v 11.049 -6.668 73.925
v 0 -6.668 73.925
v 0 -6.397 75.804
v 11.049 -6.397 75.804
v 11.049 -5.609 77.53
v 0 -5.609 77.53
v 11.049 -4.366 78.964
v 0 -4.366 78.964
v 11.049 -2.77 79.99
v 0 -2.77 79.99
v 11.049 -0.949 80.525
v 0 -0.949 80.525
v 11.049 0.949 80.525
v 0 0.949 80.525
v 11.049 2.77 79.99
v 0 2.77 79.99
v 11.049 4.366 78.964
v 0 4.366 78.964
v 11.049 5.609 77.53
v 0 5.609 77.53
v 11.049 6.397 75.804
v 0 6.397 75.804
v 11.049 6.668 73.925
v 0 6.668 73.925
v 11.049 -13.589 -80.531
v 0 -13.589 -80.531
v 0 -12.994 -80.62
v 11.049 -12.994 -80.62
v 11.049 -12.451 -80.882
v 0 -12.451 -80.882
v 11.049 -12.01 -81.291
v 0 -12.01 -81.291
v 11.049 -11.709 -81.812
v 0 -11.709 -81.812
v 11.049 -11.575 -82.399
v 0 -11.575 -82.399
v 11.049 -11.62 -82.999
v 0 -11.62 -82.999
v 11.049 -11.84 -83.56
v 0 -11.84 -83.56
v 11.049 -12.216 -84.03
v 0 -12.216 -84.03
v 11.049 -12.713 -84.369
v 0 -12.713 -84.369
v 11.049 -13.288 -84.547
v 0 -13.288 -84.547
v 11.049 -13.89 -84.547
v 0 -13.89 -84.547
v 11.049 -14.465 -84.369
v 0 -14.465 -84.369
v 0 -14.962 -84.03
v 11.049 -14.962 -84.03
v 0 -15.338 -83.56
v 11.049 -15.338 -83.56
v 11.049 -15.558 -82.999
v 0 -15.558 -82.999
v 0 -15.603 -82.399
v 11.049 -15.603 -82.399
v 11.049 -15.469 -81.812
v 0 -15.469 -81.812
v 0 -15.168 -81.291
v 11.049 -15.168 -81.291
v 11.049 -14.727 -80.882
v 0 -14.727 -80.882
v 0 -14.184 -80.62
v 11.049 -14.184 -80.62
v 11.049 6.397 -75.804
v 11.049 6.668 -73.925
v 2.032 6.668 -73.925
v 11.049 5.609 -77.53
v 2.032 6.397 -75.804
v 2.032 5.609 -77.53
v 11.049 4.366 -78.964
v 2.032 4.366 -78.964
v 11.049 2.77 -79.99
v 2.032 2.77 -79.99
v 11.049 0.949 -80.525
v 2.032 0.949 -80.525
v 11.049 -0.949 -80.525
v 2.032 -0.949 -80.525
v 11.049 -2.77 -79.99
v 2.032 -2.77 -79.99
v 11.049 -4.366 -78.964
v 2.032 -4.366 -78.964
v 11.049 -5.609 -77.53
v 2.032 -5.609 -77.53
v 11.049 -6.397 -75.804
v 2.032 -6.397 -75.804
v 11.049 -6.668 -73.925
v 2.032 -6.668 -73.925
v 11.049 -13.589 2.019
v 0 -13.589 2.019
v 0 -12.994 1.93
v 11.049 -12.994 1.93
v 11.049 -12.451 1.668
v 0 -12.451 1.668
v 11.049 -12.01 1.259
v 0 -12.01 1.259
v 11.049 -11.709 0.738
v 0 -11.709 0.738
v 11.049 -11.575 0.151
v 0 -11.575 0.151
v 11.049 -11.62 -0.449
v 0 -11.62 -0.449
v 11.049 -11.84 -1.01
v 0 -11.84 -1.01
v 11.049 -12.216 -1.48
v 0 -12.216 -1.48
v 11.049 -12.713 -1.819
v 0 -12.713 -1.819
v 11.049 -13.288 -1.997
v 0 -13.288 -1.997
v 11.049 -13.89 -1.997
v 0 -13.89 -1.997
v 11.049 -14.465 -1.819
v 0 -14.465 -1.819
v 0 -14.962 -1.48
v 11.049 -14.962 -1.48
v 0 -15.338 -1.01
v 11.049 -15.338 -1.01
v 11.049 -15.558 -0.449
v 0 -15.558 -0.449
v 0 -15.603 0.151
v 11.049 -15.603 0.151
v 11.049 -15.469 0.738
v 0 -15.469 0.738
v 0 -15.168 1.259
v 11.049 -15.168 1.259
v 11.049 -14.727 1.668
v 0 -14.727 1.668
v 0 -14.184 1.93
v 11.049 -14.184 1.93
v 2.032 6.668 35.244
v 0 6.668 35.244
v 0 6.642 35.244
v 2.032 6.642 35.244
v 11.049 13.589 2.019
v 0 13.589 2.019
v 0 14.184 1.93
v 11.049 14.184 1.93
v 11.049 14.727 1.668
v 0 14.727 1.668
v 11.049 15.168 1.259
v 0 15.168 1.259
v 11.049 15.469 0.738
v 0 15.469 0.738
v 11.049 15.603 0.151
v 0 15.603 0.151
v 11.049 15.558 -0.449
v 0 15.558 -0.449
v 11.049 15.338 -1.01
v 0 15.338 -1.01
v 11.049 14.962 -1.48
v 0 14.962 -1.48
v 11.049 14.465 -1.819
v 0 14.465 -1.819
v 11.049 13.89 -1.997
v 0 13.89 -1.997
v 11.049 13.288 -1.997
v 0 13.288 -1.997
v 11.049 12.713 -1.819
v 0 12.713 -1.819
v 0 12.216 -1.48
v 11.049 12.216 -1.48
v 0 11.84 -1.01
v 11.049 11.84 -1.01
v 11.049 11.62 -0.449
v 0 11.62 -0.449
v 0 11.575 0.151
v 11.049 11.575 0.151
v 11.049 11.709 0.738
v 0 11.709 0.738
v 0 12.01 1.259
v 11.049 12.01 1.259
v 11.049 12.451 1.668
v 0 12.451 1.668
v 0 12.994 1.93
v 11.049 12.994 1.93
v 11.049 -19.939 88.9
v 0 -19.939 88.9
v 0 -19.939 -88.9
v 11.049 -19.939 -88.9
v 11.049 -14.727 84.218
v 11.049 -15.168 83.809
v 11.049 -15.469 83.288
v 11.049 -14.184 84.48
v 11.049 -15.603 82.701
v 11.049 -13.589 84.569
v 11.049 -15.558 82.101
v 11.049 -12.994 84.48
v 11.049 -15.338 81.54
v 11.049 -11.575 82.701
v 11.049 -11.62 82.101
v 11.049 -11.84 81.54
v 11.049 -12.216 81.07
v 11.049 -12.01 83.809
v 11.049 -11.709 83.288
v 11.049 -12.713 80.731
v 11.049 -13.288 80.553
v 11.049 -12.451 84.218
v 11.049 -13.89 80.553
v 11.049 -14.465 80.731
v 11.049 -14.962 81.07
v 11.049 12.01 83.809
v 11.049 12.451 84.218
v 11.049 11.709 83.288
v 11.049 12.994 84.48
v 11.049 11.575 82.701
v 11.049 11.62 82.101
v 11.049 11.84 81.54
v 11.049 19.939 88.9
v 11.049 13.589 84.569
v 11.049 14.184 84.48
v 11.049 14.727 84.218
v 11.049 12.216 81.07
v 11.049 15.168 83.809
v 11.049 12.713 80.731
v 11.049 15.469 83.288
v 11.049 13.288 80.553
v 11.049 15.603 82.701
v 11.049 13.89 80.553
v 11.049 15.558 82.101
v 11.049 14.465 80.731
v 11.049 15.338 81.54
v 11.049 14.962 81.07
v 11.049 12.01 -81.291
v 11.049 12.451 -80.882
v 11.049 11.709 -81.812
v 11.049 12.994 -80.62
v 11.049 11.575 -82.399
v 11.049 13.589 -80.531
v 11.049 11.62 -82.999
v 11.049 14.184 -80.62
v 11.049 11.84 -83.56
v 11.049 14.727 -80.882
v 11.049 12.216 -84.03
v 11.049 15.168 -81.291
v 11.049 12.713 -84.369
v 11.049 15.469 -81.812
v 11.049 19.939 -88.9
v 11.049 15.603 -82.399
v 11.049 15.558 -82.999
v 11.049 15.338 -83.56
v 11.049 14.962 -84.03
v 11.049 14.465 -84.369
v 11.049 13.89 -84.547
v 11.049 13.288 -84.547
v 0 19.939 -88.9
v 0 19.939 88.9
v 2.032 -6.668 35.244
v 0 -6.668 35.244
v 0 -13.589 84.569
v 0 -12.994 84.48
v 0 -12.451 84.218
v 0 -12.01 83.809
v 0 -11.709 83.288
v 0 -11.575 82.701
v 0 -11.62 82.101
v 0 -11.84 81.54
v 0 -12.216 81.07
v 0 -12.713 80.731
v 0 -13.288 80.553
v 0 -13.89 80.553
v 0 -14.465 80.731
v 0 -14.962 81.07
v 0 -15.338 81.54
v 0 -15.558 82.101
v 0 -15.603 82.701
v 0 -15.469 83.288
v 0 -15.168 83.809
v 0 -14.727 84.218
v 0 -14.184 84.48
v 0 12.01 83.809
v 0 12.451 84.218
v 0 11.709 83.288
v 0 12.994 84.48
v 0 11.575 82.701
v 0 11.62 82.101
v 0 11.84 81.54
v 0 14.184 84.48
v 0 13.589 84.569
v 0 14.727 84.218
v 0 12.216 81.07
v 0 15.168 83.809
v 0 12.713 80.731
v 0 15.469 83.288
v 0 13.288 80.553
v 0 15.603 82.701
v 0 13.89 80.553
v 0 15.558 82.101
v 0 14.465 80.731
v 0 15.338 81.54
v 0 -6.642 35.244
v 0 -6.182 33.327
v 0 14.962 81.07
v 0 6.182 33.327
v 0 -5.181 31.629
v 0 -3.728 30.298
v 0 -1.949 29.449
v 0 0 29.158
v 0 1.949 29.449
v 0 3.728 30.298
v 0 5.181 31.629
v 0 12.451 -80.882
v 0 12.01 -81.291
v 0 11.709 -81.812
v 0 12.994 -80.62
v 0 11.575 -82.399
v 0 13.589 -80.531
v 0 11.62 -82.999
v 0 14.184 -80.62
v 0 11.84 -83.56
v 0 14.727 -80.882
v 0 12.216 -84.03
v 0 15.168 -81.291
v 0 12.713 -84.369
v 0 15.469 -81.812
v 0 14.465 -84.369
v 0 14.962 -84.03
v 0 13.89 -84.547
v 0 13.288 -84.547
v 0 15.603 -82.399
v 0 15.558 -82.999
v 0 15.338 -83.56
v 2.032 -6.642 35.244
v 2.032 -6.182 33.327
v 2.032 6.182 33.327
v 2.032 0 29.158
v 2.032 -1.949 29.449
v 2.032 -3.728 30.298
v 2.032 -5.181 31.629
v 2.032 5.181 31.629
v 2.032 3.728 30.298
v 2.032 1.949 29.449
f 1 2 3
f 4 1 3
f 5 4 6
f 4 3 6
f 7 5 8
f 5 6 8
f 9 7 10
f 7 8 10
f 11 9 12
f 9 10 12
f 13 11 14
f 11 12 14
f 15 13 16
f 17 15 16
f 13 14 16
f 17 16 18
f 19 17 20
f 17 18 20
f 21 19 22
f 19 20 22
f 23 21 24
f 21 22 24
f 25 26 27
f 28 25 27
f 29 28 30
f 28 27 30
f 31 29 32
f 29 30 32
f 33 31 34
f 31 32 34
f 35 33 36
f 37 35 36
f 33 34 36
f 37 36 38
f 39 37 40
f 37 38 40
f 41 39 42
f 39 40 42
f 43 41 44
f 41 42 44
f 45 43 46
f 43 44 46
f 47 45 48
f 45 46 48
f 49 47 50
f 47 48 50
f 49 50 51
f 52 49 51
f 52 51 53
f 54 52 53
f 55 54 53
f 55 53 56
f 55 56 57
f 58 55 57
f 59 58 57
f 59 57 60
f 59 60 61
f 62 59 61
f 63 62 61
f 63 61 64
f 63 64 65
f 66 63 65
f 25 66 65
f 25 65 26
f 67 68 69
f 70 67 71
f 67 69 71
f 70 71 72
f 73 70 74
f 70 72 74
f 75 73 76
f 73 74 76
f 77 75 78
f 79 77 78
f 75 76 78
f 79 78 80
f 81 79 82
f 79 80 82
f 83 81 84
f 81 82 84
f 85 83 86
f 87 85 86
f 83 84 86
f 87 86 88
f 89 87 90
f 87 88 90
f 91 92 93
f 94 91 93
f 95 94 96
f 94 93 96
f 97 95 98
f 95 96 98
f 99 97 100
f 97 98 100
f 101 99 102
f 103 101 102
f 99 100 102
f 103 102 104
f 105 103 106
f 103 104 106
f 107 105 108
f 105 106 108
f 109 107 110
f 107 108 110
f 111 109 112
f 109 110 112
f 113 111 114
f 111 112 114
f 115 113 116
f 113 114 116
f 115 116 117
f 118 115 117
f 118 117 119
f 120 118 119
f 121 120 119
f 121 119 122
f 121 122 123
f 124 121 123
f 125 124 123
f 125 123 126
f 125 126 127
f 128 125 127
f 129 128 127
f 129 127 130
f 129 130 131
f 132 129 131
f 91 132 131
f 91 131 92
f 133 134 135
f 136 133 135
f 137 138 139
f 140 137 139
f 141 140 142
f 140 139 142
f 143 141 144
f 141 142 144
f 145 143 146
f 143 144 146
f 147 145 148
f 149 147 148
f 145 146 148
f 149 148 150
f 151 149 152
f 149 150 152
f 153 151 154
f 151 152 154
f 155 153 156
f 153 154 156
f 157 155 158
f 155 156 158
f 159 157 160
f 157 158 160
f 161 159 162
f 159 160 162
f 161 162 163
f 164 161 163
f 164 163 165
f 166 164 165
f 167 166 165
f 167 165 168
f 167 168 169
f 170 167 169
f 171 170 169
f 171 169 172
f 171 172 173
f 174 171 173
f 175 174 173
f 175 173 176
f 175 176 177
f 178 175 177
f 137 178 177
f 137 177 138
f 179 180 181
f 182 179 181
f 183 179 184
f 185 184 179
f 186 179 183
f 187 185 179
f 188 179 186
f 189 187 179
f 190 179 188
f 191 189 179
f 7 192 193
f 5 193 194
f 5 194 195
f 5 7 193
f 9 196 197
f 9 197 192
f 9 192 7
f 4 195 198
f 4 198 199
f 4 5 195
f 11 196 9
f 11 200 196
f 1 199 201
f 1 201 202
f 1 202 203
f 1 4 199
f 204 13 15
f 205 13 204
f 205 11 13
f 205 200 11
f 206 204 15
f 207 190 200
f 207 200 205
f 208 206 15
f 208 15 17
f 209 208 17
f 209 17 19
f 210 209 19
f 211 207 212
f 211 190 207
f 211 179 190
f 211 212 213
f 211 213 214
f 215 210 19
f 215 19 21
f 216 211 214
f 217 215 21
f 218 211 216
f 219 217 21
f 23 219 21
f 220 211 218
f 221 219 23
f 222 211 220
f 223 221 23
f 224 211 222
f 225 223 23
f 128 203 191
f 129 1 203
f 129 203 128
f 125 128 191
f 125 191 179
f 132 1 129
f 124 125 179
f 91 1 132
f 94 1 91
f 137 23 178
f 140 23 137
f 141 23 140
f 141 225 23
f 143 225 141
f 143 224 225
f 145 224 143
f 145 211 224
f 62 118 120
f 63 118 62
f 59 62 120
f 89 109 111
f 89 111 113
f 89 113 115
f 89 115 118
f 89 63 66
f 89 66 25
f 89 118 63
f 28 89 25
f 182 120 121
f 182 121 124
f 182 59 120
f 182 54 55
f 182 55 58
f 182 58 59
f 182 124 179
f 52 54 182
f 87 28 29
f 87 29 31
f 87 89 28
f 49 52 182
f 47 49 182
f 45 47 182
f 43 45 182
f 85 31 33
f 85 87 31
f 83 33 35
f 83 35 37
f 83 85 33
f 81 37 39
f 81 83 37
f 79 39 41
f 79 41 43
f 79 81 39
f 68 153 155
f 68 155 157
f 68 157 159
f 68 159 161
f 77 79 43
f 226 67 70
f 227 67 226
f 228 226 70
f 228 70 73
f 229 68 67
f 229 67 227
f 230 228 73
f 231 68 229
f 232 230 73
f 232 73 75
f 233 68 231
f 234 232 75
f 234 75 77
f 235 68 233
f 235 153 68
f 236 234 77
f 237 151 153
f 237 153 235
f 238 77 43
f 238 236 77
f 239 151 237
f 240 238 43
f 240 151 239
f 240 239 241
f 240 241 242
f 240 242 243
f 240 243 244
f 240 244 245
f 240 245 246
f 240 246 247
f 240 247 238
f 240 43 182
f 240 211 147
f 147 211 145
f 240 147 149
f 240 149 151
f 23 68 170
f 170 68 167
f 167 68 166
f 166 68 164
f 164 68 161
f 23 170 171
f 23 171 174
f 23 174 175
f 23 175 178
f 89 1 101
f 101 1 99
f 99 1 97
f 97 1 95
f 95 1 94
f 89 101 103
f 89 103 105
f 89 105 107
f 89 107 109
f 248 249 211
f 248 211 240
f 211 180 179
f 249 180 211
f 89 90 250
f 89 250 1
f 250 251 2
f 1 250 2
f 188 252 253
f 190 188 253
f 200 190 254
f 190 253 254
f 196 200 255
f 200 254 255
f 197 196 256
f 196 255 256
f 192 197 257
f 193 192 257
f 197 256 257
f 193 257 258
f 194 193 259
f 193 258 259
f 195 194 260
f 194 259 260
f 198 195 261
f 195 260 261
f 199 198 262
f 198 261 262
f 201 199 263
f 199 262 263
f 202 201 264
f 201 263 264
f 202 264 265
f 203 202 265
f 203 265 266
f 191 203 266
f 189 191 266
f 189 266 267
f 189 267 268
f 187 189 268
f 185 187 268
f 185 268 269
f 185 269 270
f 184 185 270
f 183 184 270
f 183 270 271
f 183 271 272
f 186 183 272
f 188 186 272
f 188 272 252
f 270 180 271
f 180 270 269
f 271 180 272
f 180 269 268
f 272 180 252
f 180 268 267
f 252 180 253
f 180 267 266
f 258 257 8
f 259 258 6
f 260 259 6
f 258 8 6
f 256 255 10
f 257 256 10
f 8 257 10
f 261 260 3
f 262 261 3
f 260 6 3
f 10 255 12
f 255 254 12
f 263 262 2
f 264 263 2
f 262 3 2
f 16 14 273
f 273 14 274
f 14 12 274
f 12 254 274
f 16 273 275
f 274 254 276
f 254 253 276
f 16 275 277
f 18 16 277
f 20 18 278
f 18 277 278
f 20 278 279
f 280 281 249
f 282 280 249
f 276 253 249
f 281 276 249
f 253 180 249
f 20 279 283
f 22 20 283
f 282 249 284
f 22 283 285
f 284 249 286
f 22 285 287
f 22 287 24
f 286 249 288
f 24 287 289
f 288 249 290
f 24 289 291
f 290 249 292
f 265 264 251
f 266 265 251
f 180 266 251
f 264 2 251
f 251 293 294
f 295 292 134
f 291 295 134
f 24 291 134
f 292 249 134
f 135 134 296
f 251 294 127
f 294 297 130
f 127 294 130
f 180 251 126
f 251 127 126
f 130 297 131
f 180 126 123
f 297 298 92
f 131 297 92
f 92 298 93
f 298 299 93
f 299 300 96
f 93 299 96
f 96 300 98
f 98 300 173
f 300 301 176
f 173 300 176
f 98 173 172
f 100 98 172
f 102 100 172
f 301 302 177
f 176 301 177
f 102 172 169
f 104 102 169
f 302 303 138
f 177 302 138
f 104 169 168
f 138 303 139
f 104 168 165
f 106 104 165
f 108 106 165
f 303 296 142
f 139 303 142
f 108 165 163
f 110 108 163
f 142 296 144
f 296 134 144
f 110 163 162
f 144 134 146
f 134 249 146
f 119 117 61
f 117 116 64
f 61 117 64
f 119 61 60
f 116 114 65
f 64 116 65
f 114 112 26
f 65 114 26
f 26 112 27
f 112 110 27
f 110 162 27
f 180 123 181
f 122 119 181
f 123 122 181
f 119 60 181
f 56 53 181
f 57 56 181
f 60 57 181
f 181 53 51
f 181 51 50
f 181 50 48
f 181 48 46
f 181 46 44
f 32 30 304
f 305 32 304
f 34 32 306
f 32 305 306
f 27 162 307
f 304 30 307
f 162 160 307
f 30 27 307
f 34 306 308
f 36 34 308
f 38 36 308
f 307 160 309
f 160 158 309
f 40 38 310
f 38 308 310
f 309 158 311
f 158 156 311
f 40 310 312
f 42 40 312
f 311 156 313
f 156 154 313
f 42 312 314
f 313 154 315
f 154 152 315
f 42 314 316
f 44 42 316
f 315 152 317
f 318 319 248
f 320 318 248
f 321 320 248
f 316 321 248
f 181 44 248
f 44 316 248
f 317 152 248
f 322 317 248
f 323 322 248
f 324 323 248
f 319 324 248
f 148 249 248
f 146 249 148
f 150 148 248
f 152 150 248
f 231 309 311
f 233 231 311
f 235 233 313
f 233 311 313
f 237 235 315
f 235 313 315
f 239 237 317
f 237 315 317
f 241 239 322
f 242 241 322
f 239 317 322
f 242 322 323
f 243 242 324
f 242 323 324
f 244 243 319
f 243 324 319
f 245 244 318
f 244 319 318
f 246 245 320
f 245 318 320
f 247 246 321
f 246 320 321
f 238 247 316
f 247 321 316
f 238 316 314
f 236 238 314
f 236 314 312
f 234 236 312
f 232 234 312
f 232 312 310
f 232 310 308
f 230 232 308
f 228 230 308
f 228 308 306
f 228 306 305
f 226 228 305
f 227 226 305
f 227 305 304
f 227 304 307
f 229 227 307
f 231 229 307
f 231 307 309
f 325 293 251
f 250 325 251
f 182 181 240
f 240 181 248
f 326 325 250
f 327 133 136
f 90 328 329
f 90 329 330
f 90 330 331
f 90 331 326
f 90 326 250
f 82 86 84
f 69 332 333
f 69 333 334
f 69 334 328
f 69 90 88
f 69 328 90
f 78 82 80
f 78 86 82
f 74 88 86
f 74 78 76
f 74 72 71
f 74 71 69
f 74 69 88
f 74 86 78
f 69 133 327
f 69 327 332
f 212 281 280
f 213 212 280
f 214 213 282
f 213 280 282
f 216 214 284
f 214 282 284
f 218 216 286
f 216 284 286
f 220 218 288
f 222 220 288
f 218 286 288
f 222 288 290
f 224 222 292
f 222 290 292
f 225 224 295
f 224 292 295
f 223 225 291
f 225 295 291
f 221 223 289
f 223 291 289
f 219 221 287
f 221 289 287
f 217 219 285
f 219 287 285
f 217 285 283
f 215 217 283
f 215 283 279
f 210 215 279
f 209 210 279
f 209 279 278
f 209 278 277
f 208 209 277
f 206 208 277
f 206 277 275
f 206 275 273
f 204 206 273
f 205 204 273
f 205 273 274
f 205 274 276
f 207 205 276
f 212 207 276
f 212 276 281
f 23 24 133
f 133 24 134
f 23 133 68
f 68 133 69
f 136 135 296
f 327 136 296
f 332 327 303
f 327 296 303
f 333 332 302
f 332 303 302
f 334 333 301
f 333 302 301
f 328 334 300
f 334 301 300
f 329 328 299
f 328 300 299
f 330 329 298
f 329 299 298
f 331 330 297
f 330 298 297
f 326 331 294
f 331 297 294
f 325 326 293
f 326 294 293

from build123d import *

# Parameters (mm, degrees)
SKETCH1_W              = 177.8
SKETCH1_H              = 39.878
BOSS_EXTRUDE1_DEPTH    = 11.049
F_10_32_TAPPED_HOLE1_D = 4.0386
BOSS_EXTRUDE2_DEPTH    = 2.032


with BuildPart() as part:
    # Sketch1 → Boss-Extrude1 (new body)
    with BuildSketch(Plane(origin=(0, 0, 0), x_dir=(0, 0, -1), z_dir=(1, 0, 0))):
        Rectangle(SKETCH1_W, SKETCH1_H)
        with BuildLine():
            Line((-73.9252522, 6.6675), (73.9252522, 6.6675))
            ThreePointArc((73.9252522, 6.6675), (80.5927522, 0), (73.9252522, -6.6675))
            Line((73.9252522, -6.6675), (-73.9252522, -6.6675))
            ThreePointArc((-73.9252522, -6.6675), (-80.5927522, 0), (-73.9252522, 6.6675))
        make_face(mode=Mode.SUBTRACT)
    extrude(amount=BOSS_EXTRUDE1_DEPTH)

    # #10-32 Tapped Hole1 (through all)
    with Locations(Plane(origin=(11.049, 0, 0), x_dir=(0, 0, -1), z_dir=(1, 0, 0))):
        with Locations((-82.55, 13.589), (-82.55, -13.589), (0, -13.589), (82.55, -13.589), (82.55, 13.589), (0, 13.589)):
            Hole(F_10_32_TAPPED_HOLE1_D / 2)

    # Sketch5 → Boss-Extrude2 (add)
    with BuildSketch(Plane.ZY):
        with BuildLine():
            Line((35.243819624, 6.6675), (35.243819624, 6.6421))
            ThreePointArc((35.243819624, 6.6421), (29.1577522, 0), (35.243819624, -6.6421))
            Line((35.243819624, -6.6421), (35.243819624, -6.6675))
            Line((35.243819624, -6.6675), (-73.9252522, -6.6675))
            ThreePointArc((-73.9252522, -6.6675), (-80.5927522, 0), (-73.9252522, 6.6675))
            Line((-73.9252522, 6.6675), (35.243819624, 6.6675))
        make_face()
    extrude(amount=-BOSS_EXTRUDE2_DEPTH)


solid = part.part
